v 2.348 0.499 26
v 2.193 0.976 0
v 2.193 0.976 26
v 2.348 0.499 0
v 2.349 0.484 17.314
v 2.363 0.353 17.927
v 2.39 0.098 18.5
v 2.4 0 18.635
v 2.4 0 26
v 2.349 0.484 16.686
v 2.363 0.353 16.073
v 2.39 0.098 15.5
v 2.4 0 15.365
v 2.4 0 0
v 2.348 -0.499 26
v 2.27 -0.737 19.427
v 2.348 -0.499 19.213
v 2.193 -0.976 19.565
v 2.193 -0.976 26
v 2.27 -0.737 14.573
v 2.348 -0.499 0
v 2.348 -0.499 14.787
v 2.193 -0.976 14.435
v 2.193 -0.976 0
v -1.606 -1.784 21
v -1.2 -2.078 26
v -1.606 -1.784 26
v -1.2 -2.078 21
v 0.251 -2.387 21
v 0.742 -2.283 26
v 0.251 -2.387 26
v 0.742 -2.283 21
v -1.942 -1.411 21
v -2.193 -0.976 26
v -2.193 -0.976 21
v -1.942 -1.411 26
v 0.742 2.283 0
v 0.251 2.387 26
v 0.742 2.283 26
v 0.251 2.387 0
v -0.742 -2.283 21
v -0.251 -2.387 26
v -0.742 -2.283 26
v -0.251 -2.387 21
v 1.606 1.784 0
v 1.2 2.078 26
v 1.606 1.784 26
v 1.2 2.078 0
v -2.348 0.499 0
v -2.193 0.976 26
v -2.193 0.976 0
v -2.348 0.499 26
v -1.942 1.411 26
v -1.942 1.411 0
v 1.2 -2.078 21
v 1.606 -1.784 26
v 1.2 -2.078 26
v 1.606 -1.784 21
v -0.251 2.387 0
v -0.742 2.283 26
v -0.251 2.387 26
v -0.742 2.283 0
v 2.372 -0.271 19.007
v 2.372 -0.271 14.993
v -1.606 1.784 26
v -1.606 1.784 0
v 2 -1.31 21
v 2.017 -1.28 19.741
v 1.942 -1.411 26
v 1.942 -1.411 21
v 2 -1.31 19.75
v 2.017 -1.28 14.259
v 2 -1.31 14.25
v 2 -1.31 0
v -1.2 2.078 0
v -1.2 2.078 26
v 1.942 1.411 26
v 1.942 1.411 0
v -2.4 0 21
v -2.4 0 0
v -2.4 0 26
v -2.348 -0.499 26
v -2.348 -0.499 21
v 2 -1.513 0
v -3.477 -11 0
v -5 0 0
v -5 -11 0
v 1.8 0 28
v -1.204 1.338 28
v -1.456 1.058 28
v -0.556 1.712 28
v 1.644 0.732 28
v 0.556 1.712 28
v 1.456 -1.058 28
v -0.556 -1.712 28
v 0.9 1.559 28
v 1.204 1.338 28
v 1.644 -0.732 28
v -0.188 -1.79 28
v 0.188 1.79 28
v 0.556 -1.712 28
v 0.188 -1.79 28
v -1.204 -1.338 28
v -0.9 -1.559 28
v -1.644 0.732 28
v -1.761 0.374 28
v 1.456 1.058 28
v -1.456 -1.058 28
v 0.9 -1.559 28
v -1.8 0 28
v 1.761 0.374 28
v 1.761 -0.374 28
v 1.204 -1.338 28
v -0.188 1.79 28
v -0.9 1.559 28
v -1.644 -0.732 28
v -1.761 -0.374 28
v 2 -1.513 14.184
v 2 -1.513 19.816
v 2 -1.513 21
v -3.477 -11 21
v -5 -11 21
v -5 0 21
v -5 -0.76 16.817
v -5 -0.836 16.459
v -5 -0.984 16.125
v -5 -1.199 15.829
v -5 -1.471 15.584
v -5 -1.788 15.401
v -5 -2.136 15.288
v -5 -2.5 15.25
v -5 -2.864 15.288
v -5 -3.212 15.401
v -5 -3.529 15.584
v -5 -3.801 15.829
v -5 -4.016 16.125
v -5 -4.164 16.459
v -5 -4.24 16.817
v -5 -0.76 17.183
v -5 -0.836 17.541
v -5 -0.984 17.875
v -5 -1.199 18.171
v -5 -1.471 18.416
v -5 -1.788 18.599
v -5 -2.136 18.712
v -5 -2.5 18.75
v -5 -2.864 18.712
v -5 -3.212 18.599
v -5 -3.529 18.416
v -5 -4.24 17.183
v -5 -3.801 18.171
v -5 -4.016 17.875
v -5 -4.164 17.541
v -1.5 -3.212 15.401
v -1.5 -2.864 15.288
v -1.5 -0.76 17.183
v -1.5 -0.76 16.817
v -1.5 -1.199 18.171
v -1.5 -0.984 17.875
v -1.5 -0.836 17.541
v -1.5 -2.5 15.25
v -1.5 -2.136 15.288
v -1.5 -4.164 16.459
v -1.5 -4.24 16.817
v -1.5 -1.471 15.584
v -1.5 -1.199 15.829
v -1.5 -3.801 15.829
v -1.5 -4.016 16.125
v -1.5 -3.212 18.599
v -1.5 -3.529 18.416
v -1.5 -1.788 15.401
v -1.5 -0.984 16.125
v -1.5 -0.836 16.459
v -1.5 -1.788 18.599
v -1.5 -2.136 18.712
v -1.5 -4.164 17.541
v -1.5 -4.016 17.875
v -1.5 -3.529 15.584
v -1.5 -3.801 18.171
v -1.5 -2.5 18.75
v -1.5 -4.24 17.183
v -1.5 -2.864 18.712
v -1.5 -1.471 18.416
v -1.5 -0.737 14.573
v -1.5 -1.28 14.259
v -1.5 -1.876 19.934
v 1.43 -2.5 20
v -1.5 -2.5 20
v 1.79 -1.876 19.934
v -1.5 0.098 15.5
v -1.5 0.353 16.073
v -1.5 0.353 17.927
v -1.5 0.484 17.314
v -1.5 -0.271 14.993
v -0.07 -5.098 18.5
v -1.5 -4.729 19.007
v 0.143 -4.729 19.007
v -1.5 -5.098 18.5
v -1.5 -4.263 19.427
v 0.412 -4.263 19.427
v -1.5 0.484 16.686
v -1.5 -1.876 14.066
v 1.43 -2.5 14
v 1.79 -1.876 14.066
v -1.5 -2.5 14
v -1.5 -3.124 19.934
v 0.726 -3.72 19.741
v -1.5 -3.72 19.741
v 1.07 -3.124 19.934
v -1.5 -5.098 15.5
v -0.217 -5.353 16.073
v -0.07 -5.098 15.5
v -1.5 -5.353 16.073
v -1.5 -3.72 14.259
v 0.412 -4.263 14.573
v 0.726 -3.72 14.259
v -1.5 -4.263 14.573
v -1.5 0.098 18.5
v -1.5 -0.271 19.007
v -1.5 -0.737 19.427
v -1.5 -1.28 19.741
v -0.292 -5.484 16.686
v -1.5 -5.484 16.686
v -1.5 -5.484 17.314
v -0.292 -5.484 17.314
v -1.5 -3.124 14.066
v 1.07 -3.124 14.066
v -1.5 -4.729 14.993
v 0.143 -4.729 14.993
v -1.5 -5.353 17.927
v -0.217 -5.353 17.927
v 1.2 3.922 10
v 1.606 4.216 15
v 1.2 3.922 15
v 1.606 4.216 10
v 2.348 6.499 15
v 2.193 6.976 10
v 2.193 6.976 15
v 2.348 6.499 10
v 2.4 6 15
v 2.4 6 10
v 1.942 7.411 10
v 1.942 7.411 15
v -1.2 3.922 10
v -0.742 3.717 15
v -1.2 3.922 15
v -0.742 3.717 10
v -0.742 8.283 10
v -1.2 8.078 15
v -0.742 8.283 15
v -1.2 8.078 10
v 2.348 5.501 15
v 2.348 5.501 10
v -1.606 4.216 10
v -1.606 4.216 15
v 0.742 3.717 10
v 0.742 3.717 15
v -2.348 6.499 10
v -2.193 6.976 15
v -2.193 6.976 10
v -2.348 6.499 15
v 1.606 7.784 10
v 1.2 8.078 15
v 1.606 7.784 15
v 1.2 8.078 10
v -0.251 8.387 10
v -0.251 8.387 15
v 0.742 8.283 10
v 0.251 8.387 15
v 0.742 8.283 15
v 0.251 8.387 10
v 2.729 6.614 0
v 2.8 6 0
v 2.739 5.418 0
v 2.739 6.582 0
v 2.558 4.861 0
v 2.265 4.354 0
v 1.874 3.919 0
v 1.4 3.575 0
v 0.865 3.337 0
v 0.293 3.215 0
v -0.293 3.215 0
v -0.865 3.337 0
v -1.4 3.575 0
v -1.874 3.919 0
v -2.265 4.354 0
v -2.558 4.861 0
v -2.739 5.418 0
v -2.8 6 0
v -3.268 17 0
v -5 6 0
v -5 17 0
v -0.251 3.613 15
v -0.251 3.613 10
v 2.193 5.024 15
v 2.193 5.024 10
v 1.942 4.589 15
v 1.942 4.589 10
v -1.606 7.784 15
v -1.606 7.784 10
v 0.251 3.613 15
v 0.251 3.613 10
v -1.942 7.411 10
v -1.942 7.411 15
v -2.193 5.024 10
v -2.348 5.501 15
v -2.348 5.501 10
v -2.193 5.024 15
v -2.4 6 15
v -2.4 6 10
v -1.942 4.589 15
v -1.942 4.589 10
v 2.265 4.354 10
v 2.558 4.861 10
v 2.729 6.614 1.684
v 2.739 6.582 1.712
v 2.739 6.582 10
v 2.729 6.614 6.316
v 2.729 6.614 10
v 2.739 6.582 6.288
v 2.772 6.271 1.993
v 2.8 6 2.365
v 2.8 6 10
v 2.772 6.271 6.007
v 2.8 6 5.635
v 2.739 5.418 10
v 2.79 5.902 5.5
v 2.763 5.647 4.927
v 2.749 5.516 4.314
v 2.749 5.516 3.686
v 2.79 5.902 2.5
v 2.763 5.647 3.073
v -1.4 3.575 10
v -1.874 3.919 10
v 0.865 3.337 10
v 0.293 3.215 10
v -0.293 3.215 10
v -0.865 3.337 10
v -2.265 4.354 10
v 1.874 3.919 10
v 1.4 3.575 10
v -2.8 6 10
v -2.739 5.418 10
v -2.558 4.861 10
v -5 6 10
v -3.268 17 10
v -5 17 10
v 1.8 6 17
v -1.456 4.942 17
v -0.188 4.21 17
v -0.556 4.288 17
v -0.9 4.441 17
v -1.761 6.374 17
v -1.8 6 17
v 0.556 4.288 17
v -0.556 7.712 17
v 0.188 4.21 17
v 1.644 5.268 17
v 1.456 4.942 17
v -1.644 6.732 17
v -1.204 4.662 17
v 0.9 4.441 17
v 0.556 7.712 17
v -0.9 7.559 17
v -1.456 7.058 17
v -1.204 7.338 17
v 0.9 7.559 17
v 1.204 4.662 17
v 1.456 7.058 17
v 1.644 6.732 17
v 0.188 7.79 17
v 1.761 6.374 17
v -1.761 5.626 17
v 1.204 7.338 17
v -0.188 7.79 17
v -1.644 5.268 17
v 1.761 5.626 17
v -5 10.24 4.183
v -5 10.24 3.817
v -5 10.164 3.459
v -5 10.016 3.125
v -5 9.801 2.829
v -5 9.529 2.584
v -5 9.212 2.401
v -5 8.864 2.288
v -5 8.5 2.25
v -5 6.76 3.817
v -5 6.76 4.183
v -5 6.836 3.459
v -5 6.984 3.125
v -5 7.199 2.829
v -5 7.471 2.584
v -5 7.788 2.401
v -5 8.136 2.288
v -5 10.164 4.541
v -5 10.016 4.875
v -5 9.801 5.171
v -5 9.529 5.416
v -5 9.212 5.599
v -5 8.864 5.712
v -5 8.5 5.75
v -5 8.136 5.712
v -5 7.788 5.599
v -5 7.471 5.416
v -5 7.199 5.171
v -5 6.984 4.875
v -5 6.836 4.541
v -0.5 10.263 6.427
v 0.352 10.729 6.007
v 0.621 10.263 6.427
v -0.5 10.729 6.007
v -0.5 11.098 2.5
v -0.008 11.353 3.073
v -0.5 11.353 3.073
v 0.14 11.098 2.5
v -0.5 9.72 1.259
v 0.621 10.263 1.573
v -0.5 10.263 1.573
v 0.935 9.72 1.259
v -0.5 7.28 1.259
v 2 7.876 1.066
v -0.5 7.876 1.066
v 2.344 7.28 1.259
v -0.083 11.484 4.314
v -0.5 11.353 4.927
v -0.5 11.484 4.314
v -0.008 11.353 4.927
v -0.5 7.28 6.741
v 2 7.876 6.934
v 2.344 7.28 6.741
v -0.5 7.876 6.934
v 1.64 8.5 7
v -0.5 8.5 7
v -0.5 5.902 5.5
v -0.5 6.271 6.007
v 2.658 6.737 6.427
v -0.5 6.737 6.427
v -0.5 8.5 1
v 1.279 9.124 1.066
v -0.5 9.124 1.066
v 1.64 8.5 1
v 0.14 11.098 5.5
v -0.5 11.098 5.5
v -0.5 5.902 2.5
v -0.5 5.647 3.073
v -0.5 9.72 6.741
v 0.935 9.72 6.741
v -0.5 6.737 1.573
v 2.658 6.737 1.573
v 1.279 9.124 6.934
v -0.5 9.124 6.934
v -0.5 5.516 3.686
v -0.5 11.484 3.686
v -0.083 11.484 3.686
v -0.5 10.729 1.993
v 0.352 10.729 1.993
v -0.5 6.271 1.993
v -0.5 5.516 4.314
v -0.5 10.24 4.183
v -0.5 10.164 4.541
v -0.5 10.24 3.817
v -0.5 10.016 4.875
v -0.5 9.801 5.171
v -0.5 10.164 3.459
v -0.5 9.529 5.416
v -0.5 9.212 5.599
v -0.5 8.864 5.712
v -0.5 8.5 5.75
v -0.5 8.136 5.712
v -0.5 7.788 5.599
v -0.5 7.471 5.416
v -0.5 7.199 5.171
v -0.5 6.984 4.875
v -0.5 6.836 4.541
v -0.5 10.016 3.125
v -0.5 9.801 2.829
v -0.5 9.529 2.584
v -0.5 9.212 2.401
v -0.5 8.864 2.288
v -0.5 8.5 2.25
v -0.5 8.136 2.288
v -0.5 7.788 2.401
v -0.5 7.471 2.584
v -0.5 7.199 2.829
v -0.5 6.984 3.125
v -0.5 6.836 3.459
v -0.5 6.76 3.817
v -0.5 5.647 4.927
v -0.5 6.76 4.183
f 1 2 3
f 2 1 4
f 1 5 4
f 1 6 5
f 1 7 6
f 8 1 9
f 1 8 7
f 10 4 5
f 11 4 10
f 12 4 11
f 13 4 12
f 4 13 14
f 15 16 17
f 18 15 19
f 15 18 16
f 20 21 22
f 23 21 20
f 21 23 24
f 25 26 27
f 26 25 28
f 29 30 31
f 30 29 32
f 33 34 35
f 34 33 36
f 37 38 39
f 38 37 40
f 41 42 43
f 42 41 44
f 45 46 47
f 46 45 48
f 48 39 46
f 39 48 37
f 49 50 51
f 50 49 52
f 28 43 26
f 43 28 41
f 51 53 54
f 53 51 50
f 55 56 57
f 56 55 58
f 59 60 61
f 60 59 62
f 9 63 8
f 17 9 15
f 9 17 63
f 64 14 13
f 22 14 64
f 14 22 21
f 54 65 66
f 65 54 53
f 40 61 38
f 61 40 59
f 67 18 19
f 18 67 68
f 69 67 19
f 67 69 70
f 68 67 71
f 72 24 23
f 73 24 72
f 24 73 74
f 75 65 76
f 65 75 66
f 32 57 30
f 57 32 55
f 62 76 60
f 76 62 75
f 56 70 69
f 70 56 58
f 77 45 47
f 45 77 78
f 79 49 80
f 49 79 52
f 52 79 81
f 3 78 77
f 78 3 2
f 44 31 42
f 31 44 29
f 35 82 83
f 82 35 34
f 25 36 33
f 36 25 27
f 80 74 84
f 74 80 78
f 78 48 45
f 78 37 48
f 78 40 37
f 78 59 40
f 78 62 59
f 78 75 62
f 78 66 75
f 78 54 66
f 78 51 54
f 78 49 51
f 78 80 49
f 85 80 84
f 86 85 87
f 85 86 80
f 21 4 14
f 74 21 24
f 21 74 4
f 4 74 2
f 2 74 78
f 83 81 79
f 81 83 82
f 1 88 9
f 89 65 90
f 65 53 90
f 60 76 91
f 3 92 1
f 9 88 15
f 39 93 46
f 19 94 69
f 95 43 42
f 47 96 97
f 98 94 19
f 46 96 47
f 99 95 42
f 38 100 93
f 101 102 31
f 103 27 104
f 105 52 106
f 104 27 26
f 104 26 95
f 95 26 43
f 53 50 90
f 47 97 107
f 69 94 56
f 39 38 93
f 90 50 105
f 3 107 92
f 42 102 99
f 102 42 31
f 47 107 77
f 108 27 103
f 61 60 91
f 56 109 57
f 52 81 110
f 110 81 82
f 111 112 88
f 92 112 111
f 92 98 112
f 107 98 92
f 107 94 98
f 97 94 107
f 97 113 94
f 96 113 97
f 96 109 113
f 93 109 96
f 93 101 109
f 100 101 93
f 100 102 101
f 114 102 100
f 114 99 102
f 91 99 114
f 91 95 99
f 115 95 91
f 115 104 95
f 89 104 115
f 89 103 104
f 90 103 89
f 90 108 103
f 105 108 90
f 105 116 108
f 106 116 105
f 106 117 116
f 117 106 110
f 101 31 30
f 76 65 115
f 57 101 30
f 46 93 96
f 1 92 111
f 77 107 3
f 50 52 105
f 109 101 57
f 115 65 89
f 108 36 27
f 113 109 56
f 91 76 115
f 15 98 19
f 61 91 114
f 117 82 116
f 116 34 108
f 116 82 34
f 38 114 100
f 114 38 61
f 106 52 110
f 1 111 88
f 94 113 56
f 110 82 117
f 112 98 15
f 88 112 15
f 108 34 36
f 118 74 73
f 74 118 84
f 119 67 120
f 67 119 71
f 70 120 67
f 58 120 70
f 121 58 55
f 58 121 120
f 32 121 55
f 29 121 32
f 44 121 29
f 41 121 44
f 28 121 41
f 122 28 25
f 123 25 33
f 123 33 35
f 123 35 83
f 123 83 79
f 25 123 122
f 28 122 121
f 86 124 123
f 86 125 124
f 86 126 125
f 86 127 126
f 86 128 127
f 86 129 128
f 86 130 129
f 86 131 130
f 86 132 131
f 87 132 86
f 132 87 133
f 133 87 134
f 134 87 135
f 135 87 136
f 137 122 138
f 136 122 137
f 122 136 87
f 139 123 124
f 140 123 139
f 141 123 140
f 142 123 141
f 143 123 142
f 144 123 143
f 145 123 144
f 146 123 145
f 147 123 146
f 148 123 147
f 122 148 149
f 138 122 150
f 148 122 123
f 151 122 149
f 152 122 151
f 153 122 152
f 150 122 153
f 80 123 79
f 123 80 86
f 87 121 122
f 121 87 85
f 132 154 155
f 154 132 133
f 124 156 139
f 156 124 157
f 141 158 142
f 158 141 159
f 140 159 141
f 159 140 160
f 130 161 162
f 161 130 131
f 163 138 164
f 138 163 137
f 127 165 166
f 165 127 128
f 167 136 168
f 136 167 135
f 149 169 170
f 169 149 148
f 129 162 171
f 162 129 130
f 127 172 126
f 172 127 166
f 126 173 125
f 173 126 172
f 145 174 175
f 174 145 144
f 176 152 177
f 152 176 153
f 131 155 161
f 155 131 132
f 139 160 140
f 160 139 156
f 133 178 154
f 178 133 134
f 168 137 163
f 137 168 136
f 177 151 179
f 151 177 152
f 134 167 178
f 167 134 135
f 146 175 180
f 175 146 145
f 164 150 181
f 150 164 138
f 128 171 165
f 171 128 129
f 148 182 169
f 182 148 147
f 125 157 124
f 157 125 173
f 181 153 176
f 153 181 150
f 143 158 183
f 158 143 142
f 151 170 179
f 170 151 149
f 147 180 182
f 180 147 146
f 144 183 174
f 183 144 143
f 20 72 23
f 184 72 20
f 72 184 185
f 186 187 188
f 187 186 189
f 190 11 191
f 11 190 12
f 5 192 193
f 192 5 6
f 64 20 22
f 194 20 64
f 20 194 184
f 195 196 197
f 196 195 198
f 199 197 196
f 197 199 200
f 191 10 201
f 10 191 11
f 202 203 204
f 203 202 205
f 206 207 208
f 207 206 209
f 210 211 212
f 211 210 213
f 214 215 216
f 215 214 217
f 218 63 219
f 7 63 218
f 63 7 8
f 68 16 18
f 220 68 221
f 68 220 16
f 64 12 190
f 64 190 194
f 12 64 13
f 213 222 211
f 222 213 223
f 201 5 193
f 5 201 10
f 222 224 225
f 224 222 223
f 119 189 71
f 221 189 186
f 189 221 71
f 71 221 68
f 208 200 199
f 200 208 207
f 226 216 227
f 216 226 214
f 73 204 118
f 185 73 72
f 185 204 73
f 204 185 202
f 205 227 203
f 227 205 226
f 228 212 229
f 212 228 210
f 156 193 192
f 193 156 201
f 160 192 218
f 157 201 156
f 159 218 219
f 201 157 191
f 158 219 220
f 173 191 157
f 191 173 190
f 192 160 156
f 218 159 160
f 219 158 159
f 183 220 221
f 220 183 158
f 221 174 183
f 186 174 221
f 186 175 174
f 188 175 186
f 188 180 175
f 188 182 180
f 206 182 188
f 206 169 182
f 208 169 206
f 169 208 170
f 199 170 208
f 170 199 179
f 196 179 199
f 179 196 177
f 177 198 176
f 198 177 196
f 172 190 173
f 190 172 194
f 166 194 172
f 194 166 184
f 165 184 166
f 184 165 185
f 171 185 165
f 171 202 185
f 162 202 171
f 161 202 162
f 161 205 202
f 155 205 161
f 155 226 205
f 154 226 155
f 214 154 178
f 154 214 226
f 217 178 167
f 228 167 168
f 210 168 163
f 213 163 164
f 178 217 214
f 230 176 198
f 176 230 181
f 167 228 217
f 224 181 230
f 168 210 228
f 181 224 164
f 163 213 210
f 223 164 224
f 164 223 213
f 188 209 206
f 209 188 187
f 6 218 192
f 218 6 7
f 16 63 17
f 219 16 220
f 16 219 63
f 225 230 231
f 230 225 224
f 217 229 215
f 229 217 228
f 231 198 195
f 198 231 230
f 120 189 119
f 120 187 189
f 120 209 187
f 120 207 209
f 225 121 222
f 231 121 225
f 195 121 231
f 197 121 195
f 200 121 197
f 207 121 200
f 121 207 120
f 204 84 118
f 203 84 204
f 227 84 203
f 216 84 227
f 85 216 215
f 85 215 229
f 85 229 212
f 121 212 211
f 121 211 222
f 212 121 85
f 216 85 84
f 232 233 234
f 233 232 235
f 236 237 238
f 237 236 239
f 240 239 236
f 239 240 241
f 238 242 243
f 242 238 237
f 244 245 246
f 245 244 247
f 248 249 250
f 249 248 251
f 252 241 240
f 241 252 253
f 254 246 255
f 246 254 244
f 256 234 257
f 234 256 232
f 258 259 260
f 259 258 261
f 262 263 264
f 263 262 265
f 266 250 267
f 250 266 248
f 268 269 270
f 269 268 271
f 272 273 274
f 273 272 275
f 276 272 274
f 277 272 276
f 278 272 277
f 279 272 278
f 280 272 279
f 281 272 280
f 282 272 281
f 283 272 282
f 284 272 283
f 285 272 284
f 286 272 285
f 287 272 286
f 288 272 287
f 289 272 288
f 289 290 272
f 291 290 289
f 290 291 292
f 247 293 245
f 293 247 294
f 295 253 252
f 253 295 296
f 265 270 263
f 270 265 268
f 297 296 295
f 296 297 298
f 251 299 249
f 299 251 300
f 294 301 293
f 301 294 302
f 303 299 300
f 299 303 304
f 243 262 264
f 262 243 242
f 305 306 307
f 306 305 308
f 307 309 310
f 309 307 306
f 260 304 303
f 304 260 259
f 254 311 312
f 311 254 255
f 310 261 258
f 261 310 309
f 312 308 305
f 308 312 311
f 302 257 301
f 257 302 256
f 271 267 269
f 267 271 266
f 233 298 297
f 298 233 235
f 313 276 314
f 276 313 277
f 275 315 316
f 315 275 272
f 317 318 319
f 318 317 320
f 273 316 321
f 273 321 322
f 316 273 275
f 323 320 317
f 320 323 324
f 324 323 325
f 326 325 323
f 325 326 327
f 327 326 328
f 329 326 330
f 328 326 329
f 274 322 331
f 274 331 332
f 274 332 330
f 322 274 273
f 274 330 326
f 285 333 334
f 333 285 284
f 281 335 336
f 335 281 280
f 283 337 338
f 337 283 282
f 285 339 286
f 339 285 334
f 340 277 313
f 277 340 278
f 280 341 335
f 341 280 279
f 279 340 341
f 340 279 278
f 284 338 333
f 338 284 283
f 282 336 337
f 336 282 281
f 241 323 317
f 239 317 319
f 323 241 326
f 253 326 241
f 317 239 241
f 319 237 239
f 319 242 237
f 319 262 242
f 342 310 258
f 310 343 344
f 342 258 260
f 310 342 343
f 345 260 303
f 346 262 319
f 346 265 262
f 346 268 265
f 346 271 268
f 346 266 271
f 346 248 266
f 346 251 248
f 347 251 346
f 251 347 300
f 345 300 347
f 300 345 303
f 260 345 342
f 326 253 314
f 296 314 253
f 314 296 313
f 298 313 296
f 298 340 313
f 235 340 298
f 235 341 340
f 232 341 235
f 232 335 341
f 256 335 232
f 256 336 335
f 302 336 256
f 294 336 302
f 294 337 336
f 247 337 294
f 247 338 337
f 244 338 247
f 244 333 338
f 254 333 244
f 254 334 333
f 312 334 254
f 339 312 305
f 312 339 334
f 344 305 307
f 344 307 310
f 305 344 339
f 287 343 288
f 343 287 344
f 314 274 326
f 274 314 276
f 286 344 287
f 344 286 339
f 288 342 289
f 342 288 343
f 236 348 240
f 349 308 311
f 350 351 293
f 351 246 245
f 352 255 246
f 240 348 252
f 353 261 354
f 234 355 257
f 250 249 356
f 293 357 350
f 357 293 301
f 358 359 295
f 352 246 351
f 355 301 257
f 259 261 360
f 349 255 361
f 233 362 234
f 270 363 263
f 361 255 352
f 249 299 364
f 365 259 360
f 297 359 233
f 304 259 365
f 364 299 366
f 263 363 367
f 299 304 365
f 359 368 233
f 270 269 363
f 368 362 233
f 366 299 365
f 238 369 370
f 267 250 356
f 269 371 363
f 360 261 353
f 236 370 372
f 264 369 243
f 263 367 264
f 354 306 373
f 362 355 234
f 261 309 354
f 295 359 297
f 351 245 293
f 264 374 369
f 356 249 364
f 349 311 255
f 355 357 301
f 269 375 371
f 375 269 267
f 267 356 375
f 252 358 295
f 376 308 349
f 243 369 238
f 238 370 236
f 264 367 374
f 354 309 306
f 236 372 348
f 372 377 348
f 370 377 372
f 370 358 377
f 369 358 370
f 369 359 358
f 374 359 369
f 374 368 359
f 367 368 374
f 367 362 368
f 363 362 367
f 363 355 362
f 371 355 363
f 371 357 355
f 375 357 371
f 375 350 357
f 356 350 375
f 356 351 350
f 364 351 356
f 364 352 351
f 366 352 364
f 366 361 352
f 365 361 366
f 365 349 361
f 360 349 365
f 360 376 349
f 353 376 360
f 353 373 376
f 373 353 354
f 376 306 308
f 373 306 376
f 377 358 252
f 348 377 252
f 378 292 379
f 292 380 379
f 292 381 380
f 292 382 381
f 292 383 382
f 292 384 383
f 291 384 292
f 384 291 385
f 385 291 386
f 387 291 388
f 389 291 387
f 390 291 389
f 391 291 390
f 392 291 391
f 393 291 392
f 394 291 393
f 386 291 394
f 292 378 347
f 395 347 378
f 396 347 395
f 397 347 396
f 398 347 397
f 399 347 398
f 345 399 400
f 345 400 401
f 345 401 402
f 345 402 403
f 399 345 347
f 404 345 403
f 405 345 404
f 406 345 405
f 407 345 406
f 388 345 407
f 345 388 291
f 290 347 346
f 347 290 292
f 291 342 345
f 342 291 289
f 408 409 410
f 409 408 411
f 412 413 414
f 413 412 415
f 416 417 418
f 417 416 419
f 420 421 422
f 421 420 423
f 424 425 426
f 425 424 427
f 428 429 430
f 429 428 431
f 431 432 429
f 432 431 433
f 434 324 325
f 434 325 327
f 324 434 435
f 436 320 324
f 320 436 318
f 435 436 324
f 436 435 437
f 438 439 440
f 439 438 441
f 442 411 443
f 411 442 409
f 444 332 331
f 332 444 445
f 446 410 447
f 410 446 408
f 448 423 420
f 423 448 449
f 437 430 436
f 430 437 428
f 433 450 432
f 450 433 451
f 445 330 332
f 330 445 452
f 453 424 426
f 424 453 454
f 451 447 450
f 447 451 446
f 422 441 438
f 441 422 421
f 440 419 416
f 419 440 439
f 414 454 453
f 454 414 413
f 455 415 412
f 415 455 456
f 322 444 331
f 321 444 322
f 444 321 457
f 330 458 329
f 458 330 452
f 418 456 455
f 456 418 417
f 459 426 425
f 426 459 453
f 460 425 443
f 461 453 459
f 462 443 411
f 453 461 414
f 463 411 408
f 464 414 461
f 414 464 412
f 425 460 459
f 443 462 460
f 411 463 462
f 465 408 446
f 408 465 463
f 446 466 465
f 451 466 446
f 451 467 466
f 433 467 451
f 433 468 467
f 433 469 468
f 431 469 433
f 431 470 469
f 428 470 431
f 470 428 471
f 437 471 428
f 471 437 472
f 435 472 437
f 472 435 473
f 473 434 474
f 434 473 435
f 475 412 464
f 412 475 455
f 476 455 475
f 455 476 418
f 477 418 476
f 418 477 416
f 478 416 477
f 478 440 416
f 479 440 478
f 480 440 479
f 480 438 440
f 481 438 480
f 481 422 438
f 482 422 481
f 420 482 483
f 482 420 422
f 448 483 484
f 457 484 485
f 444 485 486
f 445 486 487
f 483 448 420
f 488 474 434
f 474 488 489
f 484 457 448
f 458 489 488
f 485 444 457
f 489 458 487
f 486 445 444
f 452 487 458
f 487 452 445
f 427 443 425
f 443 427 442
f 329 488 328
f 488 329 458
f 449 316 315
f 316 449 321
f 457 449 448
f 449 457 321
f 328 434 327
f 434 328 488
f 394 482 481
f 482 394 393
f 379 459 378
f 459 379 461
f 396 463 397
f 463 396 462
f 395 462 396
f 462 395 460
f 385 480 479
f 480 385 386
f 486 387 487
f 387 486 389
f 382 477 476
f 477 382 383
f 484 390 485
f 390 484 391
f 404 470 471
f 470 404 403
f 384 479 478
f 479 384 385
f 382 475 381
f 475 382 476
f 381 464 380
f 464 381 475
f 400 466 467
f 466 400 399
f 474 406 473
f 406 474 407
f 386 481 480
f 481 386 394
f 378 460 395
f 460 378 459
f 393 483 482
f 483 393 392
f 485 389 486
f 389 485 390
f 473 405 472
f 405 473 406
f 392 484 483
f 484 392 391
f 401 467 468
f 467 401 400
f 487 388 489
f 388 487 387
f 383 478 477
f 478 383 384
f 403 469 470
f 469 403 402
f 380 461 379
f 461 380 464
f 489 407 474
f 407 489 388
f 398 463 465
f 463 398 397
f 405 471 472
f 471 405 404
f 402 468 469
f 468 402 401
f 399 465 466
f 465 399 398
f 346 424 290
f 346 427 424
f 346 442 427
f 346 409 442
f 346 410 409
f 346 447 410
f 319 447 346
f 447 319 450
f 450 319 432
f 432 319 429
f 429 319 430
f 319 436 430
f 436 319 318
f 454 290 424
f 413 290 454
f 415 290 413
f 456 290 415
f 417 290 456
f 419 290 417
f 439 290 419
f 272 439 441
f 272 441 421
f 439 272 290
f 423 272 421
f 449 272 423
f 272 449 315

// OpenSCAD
// PRUSA iteration3
// RAMBo cover hinges
// GNU GPL v3
// Josef Průša <iam@josefprusa.cz> and contributors
// http://www.reprap.org/wiki/Prusa_Mendel
// http://prusamendel.org

module upper_hinge()
{
difference()    
{
    union(){
     // body
     cylinder( h = 26, r = 2.4, $fn=30); 
     translate([0,0,26]) cylinder( h = 2, r1 = 2.4, r2 = 1.8, $fn=30); 
     translate( [ -5 , -11 , 0 ] ) cube( [ 7 , 11 , 21 ] );  
    }
     // M3 screw hole
     translate( [ -12.5 , -2.5 , 17 ] ) rotate( [0,90,0] ) cylinder( h = 20, r = 1.75, $fn=30);  
     translate( [ -1.5 , -2.5 , 17 ] ) rotate( [0,90,0] ) cylinder( h = 9, r = 3, $fn=30); 
     // angle cut
     translate([-2.9,-20,-1]) rotate([0,0,60]) cube([25,5,26]);   
}
}

module lower_hinge()
{
difference()
{   
   union(){ 
    // body   
    translate( [ 0 , 6 , 0 ] ) cylinder( h = 15, r = 2.4, $fn=30); 
    translate( [ 0 , 6 , 0 ] ) cylinder( h = 10, r = 2.8, $fn=30);  
    translate( [ 0 , 6 , 15 ] ) cylinder( h = 2, r1 = 2.4, r2=1.8, $fn=30);  
    translate( [ -5 , 6 , 0 ] ) cube( [ 7 , 11 , 10 ] ); 
   }
    // M3 screw
    translate( [ -0.5 , 8.5 , 4 ] ) rotate( [0,90,0] ) cylinder( h = 20, r = 3, $fn=30); 
    translate( [ -12 , 8.5 , 4 ] ) rotate( [0,90,0] ) cylinder( h = 20, r = 1.75, $fn=30); 
    // angle cut
    translate([-5,20,-1]) rotate([0,0,-60]) cube([20,5,20]);   
}
}


upper_hinge();
lower_hinge();
